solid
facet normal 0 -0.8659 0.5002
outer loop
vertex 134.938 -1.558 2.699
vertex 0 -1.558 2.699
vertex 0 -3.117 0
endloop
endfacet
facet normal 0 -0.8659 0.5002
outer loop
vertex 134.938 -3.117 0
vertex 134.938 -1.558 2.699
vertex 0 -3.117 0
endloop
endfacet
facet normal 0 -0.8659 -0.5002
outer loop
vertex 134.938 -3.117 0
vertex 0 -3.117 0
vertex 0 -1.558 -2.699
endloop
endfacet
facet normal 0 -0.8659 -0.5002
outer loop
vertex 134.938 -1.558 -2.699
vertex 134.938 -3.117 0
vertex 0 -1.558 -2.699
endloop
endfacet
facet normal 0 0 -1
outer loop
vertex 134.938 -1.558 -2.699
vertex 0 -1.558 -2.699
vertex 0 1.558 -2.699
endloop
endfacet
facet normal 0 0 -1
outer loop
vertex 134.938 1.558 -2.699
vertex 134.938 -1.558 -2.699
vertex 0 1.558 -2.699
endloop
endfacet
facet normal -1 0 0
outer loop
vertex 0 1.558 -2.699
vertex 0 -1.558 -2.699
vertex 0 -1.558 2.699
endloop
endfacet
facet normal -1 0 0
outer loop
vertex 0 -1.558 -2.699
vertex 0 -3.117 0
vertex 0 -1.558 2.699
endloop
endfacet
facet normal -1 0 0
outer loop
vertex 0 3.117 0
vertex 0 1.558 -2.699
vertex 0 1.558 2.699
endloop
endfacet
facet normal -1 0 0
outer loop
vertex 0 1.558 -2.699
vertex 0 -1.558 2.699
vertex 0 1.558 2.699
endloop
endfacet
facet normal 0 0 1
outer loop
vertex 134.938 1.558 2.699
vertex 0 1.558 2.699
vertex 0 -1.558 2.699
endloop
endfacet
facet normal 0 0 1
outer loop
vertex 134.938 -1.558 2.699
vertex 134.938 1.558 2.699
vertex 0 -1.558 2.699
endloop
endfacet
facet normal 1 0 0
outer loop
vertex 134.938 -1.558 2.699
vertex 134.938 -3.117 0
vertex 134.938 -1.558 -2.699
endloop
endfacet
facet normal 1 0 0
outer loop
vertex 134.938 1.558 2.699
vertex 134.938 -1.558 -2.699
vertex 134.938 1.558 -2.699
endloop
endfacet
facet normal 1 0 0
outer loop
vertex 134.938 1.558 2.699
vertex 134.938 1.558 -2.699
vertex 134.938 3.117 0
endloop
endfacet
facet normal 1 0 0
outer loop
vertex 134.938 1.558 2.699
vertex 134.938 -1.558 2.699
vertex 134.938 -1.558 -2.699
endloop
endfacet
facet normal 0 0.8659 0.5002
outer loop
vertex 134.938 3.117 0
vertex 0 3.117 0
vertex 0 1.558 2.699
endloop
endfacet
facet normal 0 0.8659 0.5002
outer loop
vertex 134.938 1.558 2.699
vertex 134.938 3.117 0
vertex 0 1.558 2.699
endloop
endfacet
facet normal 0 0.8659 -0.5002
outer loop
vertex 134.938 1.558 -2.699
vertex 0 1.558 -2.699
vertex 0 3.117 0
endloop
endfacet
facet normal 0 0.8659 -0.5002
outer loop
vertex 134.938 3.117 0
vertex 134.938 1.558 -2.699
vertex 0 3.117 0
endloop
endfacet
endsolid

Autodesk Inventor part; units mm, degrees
ref_plane "YZ Plane" through (0, 0, 0) normal (1, 0, 0) x (0, 1, 0)
ref_plane "XZ Plane" through (0, 0, 0) normal (0, 1, 0) x (-1, 0, 0)
ref_plane "XY Plane" through (0, 0, 0) normal (0, 0, 1) x (1, 0, 0)
sketch "Sketch1" plane through (0, 0, 0) normal (1, 0, 0) x (0, 1, 0)
  line L0 (-1.5584, 2.6992) -> (-3.1168, 0)
  line L1 (1.5584, 2.6992) -> (-1.5584, 2.6992)
  line L2 (3.1168, 0) -> (1.5584, 2.6992)
  line L3 (1.5584, -2.6992) -> (3.1168, 0)
  line L4 (-1.5584, -2.6992) -> (1.5584, -2.6992)
  line L5 (-3.1168, 0) -> (-1.5584, -2.6992)
  point P0 (0, 0)
  point P1 (0, 0)
  point P2 (0, 0)
extrude "Extrusion1" add sketch "Sketch1" along normal blind 134.9375
sketch "Sketch2" plane through (0, 0, 0) normal (-1, 0, 0) x (0, 0, 1)
  point P0 (0, 0)
  point P1 (0, 0)
sketch "Sketch3" plane through (134.9375, 0, 0) normal (1, 0, 0) x (0, 0, -1)
  point P0 (0, 0)
  point P1 (0, 0)
properties part number "HexShaft"
